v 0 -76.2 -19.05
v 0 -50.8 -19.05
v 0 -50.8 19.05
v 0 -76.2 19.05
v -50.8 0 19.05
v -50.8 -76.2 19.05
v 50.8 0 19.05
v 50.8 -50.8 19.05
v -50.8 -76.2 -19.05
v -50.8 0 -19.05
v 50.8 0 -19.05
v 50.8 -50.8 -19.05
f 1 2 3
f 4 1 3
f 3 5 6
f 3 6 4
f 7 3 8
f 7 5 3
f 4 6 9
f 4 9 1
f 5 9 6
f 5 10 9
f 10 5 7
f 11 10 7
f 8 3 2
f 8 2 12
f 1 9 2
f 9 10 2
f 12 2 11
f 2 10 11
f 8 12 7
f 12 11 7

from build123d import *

# Parameters (mm, degrees)
F0_W      = 101.6
F0_H      = 38.1
F1_DEPTH  = 25.4
F2_W      = 50.8
F2_H      = 38.1
F3_DEPTH  = 25.4
F1_FACE_W = 50.8
F1_FACE_H = 38.1
F4_DEPTH  = 50.8


with BuildPart() as f1:
    # F0 (on Front) → F1 (new body)
    with BuildSketch(Plane.XZ):
        Rectangle(F0_W, F0_H)
    extrude(amount=F1_DEPTH)

    # F2 (on face) → F3 (join)
    with BuildSketch(Plane.XZ.offset(25.4)):
        with Locations((25.4, 0)):
            Rectangle(F2_W, F2_H)
    extrude(amount=F3_DEPTH)

    # F1_face (on face) → F4 (join)
    with BuildSketch(Plane.XZ.offset(25.4)):
        with Locations((-25.4, 0)):
            Rectangle(F1_FACE_W, F1_FACE_H)
    extrude(amount=F4_DEPTH)


solid = f1.part
